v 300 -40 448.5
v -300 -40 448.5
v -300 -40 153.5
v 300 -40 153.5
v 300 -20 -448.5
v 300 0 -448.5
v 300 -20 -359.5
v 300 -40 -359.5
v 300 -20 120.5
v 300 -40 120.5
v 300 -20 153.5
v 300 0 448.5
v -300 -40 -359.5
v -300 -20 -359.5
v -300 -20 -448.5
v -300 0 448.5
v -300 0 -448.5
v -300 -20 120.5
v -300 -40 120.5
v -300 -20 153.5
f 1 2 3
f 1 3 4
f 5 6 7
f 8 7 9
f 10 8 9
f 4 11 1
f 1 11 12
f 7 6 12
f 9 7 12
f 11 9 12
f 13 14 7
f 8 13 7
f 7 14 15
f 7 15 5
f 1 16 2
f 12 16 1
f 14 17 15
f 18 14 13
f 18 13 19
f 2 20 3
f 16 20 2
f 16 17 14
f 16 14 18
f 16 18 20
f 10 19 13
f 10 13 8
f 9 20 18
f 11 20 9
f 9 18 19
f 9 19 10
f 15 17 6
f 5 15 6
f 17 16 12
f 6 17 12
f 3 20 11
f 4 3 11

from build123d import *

# Parameters (mm, degrees)
F0_W     = 600
F0_H     = 897
F1_DEPTH = 20
F2_W     = 600
F2_H     = 295
F2_H_2   = 480
F3_DEPTH = 20


with BuildPart() as f1:
    # F0 (on Front) → F1 (new body)
    with BuildSketch(Plane.XZ):
        Rectangle(F0_W, F0_H)
    extrude(amount=F1_DEPTH)

    # F2 (on face) → F3 (join)
    with BuildSketch(Plane.XZ.offset(20)):
        with Locations((0, 301)):
            Rectangle(F2_W, F2_H)
        with Locations((0, -119.5)):
            Rectangle(F2_W, F2_H_2)
    extrude(amount=F3_DEPTH)


solid = f1.part
